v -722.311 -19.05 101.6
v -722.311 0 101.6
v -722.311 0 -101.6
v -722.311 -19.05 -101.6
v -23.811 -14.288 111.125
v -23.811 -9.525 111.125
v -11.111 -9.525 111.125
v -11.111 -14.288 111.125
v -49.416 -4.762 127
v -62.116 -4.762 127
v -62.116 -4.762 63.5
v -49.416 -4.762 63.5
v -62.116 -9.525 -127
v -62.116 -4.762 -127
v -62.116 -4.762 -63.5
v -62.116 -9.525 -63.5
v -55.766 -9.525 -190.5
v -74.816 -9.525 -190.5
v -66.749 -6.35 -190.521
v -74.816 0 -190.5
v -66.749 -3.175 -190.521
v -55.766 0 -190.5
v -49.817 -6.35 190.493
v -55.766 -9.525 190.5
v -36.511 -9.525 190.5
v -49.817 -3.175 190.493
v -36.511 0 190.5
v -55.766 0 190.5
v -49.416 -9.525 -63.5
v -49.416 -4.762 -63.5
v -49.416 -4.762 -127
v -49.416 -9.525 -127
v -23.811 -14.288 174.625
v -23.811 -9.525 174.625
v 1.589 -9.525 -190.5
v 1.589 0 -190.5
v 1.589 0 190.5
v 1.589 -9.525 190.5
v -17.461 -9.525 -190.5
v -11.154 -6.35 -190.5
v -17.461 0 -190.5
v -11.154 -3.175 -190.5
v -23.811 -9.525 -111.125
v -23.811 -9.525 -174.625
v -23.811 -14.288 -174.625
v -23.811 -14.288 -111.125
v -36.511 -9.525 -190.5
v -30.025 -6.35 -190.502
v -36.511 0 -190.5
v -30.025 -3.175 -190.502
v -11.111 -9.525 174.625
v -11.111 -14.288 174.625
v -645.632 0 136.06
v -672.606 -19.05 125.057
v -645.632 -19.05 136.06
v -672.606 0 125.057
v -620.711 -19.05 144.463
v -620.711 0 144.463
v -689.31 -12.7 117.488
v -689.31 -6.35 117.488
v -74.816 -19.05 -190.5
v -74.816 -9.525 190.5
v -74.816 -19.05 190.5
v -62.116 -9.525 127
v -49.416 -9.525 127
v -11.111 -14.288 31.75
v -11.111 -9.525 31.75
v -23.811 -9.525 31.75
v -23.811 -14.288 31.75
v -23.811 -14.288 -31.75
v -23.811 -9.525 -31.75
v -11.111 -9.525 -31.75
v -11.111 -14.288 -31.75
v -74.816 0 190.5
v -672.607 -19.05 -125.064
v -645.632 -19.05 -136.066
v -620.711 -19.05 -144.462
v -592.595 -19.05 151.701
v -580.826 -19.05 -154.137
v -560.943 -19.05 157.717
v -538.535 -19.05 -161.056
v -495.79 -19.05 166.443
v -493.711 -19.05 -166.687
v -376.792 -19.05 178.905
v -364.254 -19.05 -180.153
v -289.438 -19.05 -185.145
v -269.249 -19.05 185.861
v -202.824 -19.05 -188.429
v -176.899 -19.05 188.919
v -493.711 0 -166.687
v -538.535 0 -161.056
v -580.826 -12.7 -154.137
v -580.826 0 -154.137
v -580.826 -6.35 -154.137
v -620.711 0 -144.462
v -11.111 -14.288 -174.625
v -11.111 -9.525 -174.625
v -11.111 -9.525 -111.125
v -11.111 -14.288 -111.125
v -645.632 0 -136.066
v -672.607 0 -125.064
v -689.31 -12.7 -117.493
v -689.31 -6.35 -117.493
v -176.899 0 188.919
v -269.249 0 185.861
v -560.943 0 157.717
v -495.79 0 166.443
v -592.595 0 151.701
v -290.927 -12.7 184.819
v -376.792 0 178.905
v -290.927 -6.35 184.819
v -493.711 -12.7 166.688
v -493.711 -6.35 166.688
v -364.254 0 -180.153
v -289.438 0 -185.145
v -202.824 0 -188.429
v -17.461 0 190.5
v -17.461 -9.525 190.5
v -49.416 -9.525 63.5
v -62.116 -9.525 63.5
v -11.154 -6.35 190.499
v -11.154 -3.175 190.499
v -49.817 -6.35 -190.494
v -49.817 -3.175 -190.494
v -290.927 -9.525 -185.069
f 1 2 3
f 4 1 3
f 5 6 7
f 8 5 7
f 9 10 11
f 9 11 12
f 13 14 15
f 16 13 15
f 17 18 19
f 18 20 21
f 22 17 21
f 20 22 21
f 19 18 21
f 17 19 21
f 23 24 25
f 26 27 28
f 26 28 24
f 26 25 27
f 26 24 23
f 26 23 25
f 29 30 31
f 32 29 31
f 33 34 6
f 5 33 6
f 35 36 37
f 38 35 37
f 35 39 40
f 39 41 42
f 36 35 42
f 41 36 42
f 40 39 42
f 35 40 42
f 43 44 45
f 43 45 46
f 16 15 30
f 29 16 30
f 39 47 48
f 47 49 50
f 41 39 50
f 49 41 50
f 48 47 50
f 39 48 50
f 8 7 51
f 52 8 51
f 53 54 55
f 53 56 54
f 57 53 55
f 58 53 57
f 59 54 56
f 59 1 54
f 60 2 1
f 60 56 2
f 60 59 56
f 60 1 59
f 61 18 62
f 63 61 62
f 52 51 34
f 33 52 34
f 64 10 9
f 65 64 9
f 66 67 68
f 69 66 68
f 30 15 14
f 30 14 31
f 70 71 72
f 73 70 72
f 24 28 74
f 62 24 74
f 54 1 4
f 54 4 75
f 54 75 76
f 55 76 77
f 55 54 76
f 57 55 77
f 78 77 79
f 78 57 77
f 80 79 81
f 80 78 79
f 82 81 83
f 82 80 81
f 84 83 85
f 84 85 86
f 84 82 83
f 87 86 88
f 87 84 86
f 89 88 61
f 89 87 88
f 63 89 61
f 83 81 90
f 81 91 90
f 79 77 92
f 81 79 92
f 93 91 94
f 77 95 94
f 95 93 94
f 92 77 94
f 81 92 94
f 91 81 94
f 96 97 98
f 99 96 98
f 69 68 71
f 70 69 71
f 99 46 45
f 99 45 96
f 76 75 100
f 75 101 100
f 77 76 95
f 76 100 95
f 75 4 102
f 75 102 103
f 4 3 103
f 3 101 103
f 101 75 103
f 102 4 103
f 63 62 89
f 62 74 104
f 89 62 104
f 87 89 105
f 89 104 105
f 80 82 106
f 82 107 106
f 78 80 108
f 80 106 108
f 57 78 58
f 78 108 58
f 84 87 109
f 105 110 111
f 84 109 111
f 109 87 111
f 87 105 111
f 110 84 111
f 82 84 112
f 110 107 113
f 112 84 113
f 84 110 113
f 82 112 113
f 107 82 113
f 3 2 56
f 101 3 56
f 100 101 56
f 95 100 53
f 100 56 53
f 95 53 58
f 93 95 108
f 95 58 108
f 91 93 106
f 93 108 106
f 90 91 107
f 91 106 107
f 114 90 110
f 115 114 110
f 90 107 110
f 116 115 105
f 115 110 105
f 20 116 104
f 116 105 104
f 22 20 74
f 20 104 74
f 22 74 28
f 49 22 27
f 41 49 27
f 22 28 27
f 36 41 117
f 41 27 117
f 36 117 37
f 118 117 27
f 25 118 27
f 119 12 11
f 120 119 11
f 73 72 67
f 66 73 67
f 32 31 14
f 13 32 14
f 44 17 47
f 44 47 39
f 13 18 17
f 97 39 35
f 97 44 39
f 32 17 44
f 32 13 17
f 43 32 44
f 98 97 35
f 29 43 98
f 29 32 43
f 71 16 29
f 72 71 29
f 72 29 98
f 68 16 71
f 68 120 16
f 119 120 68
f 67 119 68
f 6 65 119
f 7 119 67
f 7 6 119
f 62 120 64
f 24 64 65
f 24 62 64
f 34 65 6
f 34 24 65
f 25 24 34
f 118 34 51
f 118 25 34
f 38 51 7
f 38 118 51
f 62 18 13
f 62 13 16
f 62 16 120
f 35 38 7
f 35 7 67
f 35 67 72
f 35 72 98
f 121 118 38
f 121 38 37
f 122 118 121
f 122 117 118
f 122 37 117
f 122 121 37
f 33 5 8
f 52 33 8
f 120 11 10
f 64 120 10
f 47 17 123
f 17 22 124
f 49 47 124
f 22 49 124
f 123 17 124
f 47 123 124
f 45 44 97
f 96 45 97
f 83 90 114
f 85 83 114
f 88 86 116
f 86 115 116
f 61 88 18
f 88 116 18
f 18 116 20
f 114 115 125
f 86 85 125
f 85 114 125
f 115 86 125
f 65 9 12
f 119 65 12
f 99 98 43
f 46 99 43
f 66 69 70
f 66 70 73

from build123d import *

# Parameters (mm, degrees)
F1_DEPTH = 19.05
F2_DEPTH = 9.525
F0_W     = 6.35
F0_H     = 63.5
F3_DEPTH = 4.7625
F0_H_2   = 31.75
F4_DEPTH = 14.2875


with BuildPart() as f1:
    # F0 (on Front) → F1 (new body)
    with BuildSketch(Plane.XZ):
        with BuildLine():
            Line((-722.3111987114, 1.2279e-06), (-620.7111987114, 1.2279e-06))
            Line((-620.7111987114, 1.2279e-06), (-620.7111987114, 144.4625012279))
            add(Edge.make_bspline(
                [(-722.3111987114, 101.6000012279), (-689.4180363188, 117.6879881372), (-656.5248739262, 133.7759750465), (-620.7111987114, 144.4625012279)],
                knots=[0, 0, 0, 0, 0.1537268507, 0.1537268507, 0.1537268507, 0.1537268507], degree=3))
            Line((-722.3111987114, 101.6000012279), (-722.3111987114, 1.2279e-06))
        make_face()
        with BuildLine():
            Line((-620.7111987114, 1.2279e-06), (-493.7111987114, 1.2279e-06))
            Line((-493.7111987114, 1.2279e-06), (-493.7111987114, 166.6875012279))
            add(Edge.make_bspline(
                [(-620.7111987114, 144.4625012279), (-581.9859047534, 156.0178321253), (-539.8459247327, 161.2577335799), (-493.7111987114, 166.6875012279)],
                knots=[0.1537268507, 0.1537268507, 0.1537268507, 0.1537268507, 0.3199515525, 0.3199515525, 0.3199515525, 0.3199515525], degree=3))
            Line((-620.7111987114, 144.4625012279), (-620.7111987114, 1.2279e-06))
        make_face()
        with BuildLine():
            Line((-620.7111987114, -144.4624987721), (-620.7111987114, 1.2279e-06))
            Line((-620.7111987114, 1.2279e-06), (-722.3111987114, 1.2279e-06))
            Line((-722.3111987114, 1.2279e-06), (-722.3111987114, -101.5999987721))
            add(Edge.make_bspline(
                [(-722.3111987114, -101.5999987721), (-689.4182841733, -117.6941564691), (-656.5253696352, -133.7883141661), (-620.7111987114, -144.4624987721)],
                knots=[0, 0, 0, 0, 0.1537255771, 0.1537255771, 0.1537255771, 0.1537255771], degree=3))
        make_face()
        with BuildLine():
            Line((-493.7111987114, -166.6874987721), (-493.7111987114, 1.2279e-06))
            Line((-493.7111987114, 1.2279e-06), (-620.7111987114, 1.2279e-06))
            Line((-620.7111987114, 1.2279e-06), (-620.7111987114, -144.4624987721))
            add(Edge.make_bspline(
                [(-620.7111987114, -144.4624987721), (-581.9853687438, -156.0044847356), (-539.8439833334, -161.2093964589), (-493.7111987114, -166.6874987721)],
                knots=[0.1537255771, 0.1537255771, 0.1537255771, 0.1537255771, 0.3199489018, 0.3199489018, 0.3199489018, 0.3199489018], degree=3))
        make_face()
        with BuildLine():
            Line((-290.9272084468, -185.0685181572), (-290.9272084468, -0.1247681572))
            Line((-290.9272084468, -0.1247681572), (-290.9272084468, 1.2279e-06))
            Line((-290.9272084468, 1.2279e-06), (-493.7111987114, 1.2279e-06))
            Line((-493.7111987114, 1.2279e-06), (-493.7111987114, -166.6874987721))
            add(Edge.make_bspline(
                [(-493.7111987114, -166.6874987721), (-435.736581071, -173.5717761816), (-371.4584655156, -180.8874953545), (-290.9272084468, -185.0685181572)],
                knots=[0.3199489018, 0.3199489018, 0.3199489018, 0.3199489018, 0.5288401224, 0.5288401224, 0.5288401224, 0.5288401224], degree=3))
        make_face()
        with BuildLine():
            Line((-493.7111987114, 1.2279e-06), (-290.9272084468, 1.2279e-06))
            Line((-290.9272084468, 1.2279e-06), (-290.9272084468, 184.8189818428))
            add(Edge.make_bspline(
                [(-493.7111987114, 166.6875012279), (-435.7373269286, 173.5106620133), (-371.4553650094, 180.633639874), (-290.9272084468, 184.8189818428)],
                knots=[0.3199515525, 0.3199515525, 0.3199515525, 0.3199515525, 0.528833026, 0.528833026, 0.528833026, 0.528833026], degree=3))
            Line((-493.7111987114, 166.6875012279), (-493.7111987114, 1.2279e-06))
        make_face()
        with BuildLine():
            Line((-290.9272084468, 184.8189818428), (-290.9272084468, 1.2279e-06))
            Line((-290.9272084468, 1.2279e-06), (-74.8163211554, 1.2279e-06))
            Line((-74.8163211554, 1.2279e-06), (-74.8163211554, 190.5000012279))
            add(Edge.make_bspline(
                [(-290.9272084468, 184.8189818428), (-207.9460116468, 189.1318172586), (-107.7137651743, 190.3253189595), (-74.8163211554, 190.5000012279)],
                knots=[0.528833026, 0.528833026, 0.528833026, 0.528833026, 0.744077425, 0.744077425, 0.744077425, 0.744077425], degree=3))
        make_face()
        with BuildLine():
            Line((-290.9272084468, 1.2279e-06), (-290.9272084468, -0.1247681572))
            Line((-290.9272084468, -0.1247681572), (-290.9272084468, -185.0685181572))
            add(Edge.make_bspline(
                [(-290.9272084468, -185.0685181572), (-207.9486072246, -189.376602204), (-107.7139882364, -190.35656804), (-74.8163211554, -190.4999987721)],
                knots=[0.5288401224, 0.5288401224, 0.5288401224, 0.5288401224, 0.7440795453, 0.7440795453, 0.7440795453, 0.7440795453], degree=3))
            Line((-74.8163211554, -190.4999987721), (-74.8163211554, 1.2279e-06))
            Line((-74.8163211554, 1.2279e-06), (-290.9272084468, 1.2279e-06))
        make_face()
    extrude(amount=F1_DEPTH)

    # F0 (on Front) → F2 (join)
    with BuildSketch(Plane.XZ):
        Polygon((-74.8163211554, 190.5000012279), (-74.8163211554, 1.2279e-06), (-55.7663211554, 1.2279e-06), (-55.7663211554, 63.5000012279), (-62.1163211554, 63.5000012279), (-62.1163211554, 127.0000012279), (-55.7663211554, 127.0000012279), (-55.7663211554, 190.5000012279), align=None)
        with BuildLine():
            Line((-55.7663211554, 1.2279e-06), (-74.8163211554, 1.2279e-06))
            Line((-74.8163211554, 1.2279e-06), (-74.8163211554, -190.4999987721))
            add(Edge.make_bspline(
                [(-74.8163211554, -190.4999987721), (-65.0505687749, -190.5425765334), (-61.2186404836, -190.5114376797), (-55.7663211554, -190.4999987721)],
                knots=[0.7440795453, 0.7440795453, 0.7440795453, 0.7440795453, 0.8079738908, 0.8079738908, 0.8079738908, 0.8079738908], degree=3))
            Line((-55.7663211554, -190.4999987721), (-55.7663211554, -126.9999987721))
            Line((-55.7663211554, -126.9999987721), (-62.1163211554, -126.9999987721))
            Line((-62.1163211554, -126.9999987721), (-62.1163211554, -63.4999987721))
            Line((-62.1163211554, -63.4999987721), (-55.7663211554, -63.4999987721))
            Line((-55.7663211554, -63.4999987721), (-55.7663211554, 1.2279e-06))
        make_face()
        with BuildLine():
            Line((-55.7663211554, 63.5000012279), (-55.7663211554, 1.2279e-06))
            Line((-55.7663211554, 1.2279e-06), (-36.7163211554, 1.2279e-06))
            Line((-36.7163211554, 1.2279e-06), (-36.5111987114, 1.2279e-06))
            Line((-36.5111987114, 1.2279e-06), (-36.5111987114, 190.5000012279))
            add(Edge.make_bspline(
                [(-55.7663211554, 190.5000012279), (-50.284669262, 190.4859953489), (-43.1652773507, 190.4962397359), (-36.5111987114, 190.5000012279)],
                knots=[0.8079722998, 0.8079722998, 0.8079722998, 0.8079722998, 0.8722102503, 0.8722102503, 0.8722102503, 0.8722102503], degree=3))
            Line((-55.7663211554, 190.5000012279), (-55.7663211554, 127.0000012279))
            Line((-55.7663211554, 127.0000012279), (-49.4163211554, 127.0000012279))
            Line((-49.4163211554, 127.0000012279), (-49.4163211554, 63.5000012279))
            Line((-49.4163211554, 63.5000012279), (-55.7663211554, 63.5000012279))
        make_face()
        with BuildLine():
            Line((-36.7163211554, 1.2279e-06), (-55.7663211554, 1.2279e-06))
            Line((-55.7663211554, 1.2279e-06), (-55.7663211554, -63.4999987721))
            Line((-55.7663211554, -63.4999987721), (-49.4163211554, -63.4999987721))
            Line((-49.4163211554, -63.4999987721), (-49.4163211554, -126.9999987721))
            Line((-49.4163211554, -126.9999987721), (-55.7663211554, -126.9999987721))
            Line((-55.7663211554, -126.9999987721), (-55.7663211554, -190.4999987721))
            add(Edge.make_bspline(
                [(-55.7663211554, -190.4999987721), (-50.2847262742, -190.4884984448), (-43.1652926622, -190.4969101842), (-36.5111987114, -190.4999987721)],
                knots=[0.8079738908, 0.8079738908, 0.8079738908, 0.8079738908, 0.872211309, 0.872211309, 0.872211309, 0.872211309], degree=3))
            Line((-36.5111987114, -190.4999987721), (-36.5111987114, 1.2279e-06))
            Line((-36.5111987114, 1.2279e-06), (-36.7163211554, 1.2279e-06))
        make_face()
        with BuildLine():
            Line((-36.5111987114, 1.2279e-06), (-36.5111987114, -190.4999987721))
            add(Edge.make_bspline(
                [(-36.5111987114, -190.4999987721), (-29.8926422792, -190.5030708649), (-23.7344683022, -190.5008765129), (-17.4611987114, -190.4999987721)],
                knots=[0.872211309, 0.872211309, 0.872211309, 0.872211309, 0.9361056545, 0.9361056545, 0.9361056545, 0.9361056545], degree=3))
            Line((-17.4611987114, -190.4999987721), (-17.4611987114, -174.6249987721))
            Line((-17.4611987114, -174.6249987721), (-23.8111987114, -174.6249987721))
            Line((-23.8111987114, -174.6249987721), (-23.8111987114, -111.1249987721))
            Line((-23.8111987114, -111.1249987721), (-17.4611987114, -111.1249987721))
            Line((-17.4611987114, -111.1249987721), (-17.4611987114, -95.2499987721))
            Line((-17.4611987114, -95.2499987721), (-17.4611987114, -31.7499987721))
            Line((-17.4611987114, -31.7499987721), (-23.8111987114, -31.7499987721))
            Line((-23.8111987114, -31.7499987721), (-23.8111987114, 1.2279e-06))
            Line((-23.8111987114, 1.2279e-06), (-36.5111987114, 1.2279e-06))
        make_face()
        Polygon((-17.4611987114, 190.5000012279), (-36.5111987114, 190.5000012279), (-36.5111987114, 1.2279e-06), (-23.8111987114, 1.2279e-06), (-23.8111987114, 31.7500012279), (-17.4611987114, 31.7500012279), (-17.4611987114, 95.2500012279), (-17.4611987114, 111.1250012279), (-23.8111987114, 111.1250012279), (-23.8111987114, 174.6250012279), (-17.4611987114, 174.6250012279), align=None)
        with BuildLine():
            Line((-17.4611987114, -174.6249987721), (-17.4611987114, -190.4999987721))
            add(Edge.make_bspline(
                [(-17.4611987114, -190.4999987721), (-11.1879291206, -190.4991210314), (-4.799563916, -190.4995599018), (1.5888012886, -190.4999987721)],
                knots=[0.9361056545, 0.9361056545, 0.9361056545, 0.9361056545, 1, 1, 1, 1], degree=3))
            Line((1.5888012886, -190.4999987721), (1.5888012886, 1.2279e-06))
            Line((1.5888012886, 1.2279e-06), (-11.1111987114, 1.2279e-06))
            Line((-11.1111987114, 1.2279e-06), (-11.1111987114, -31.7499987721))
            Line((-11.1111987114, -31.7499987721), (-17.4611987114, -31.7499987721))
            Line((-17.4611987114, -31.7499987721), (-17.4611987114, -95.2499987721))
            Line((-17.4611987114, -95.2499987721), (-17.4611987114, -111.1249987721))
            Line((-17.4611987114, -111.1249987721), (-11.1111987114, -111.1249987721))
            Line((-11.1111987114, -111.1249987721), (-11.1111987114, -174.6249987721))
            Line((-11.1111987114, -174.6249987721), (-17.4611987114, -174.6249987721))
        make_face()
        with BuildLine():
            add(Edge.make_bspline(
                [(-17.4611987114, 190.5000012279), (-11.1879247692, 190.4989322556), (-4.7995617403, 190.4994667417), (1.5888012886, 190.5000012279)],
                knots=[0.9361051251, 0.9361051251, 0.9361051251, 0.9361051251, 1, 1, 1, 1], degree=3))
            Line((-17.4611987114, 190.5000012279), (-17.4611987114, 174.6250012279))
            Line((-17.4611987114, 174.6250012279), (-11.1111987114, 174.6250012279))
            Line((-11.1111987114, 174.6250012279), (-11.1111987114, 111.1250012279))
            Line((-11.1111987114, 111.1250012279), (-17.4611987114, 111.1250012279))
            Line((-17.4611987114, 111.1250012279), (-17.4611987114, 95.2500012279))
            Line((-17.4611987114, 95.2500012279), (-17.4611987114, 31.7500012279))
            Line((-17.4611987114, 31.7500012279), (-11.1111987114, 31.7500012279))
            Line((-11.1111987114, 31.7500012279), (-11.1111987114, 1.2279e-06))
            Line((-11.1111987114, 1.2279e-06), (1.5888012886, 1.2279e-06))
            Line((1.5888012886, 1.2279e-06), (1.5888012886, 190.5000012279))
        make_face()
        Polygon((-11.1111987114, 174.6250012279), (-17.4611987114, 174.6250012279), (-17.4611987114, 142.8750012279), (-17.4611987114, 111.1250012279), (-11.1111987114, 111.1250012279), align=None)
        Polygon((-17.4611987114, 142.8750012279), (-17.4611987114, 174.6250012279), (-23.8111987114, 174.6250012279), (-23.8111987114, 111.1250012279), (-17.4611987114, 111.1250012279), align=None)
    extrude(amount=F2_DEPTH)

    # F0 (on Front) → F3 (join)
    with BuildSketch(Plane.XZ):
        with Locations((-58.9413211554, -95.2499987721)):
            Rectangle(F0_W, F0_H)
        with Locations((-52.5913211554, -95.2499987721)):
            Rectangle(F0_W, F0_H)
        Polygon((-74.8163211554, 190.5000012279), (-74.8163211554, 1.2279e-06), (-55.7663211554, 1.2279e-06), (-55.7663211554, 63.5000012279), (-62.1163211554, 63.5000012279), (-62.1163211554, 127.0000012279), (-55.7663211554, 127.0000012279), (-55.7663211554, 190.5000012279), align=None)
        Polygon((-62.1163211554, 63.5000012279), (-55.7663211554, 63.5000012279), (-55.7663211554, 95.2500012279), (-55.7663211554, 127.0000012279), (-62.1163211554, 127.0000012279), align=None)
        with BuildLine():
            Line((-55.7663211554, 63.5000012279), (-55.7663211554, 1.2279e-06))
            Line((-55.7663211554, 1.2279e-06), (-36.7163211554, 1.2279e-06))
            Line((-36.7163211554, 1.2279e-06), (-36.5111987114, 1.2279e-06))
            Line((-36.5111987114, 1.2279e-06), (-36.5111987114, 190.5000012279))
            add(Edge.make_bspline(
                [(-55.7663211554, 190.5000012279), (-50.284669262, 190.4859953489), (-43.1652773507, 190.4962397359), (-36.5111987114, 190.5000012279)],
                knots=[0.8079722998, 0.8079722998, 0.8079722998, 0.8079722998, 0.8722102503, 0.8722102503, 0.8722102503, 0.8722102503], degree=3))
            Line((-55.7663211554, 190.5000012279), (-55.7663211554, 127.0000012279))
            Line((-55.7663211554, 127.0000012279), (-49.4163211554, 127.0000012279))
            Line((-49.4163211554, 127.0000012279), (-49.4163211554, 63.5000012279))
            Line((-49.4163211554, 63.5000012279), (-55.7663211554, 63.5000012279))
        make_face()
        Polygon((-55.7663211554, 95.2500012279), (-55.7663211554, 63.5000012279), (-49.4163211554, 63.5000012279), (-49.4163211554, 127.0000012279), (-55.7663211554, 127.0000012279), align=None)
    extrude(amount=F3_DEPTH)

    # F0 (on Front) → F4 (join)
    with BuildSketch(Plane.XZ):
        with Locations((-20.6361987114, 15.8750012279)):
            Rectangle(F0_W, F0_H_2)
        with Locations((-20.6361987114, -15.8749987721)):
            Rectangle(F0_W, F0_H_2)
        with Locations((-20.6361987114, -142.8749987721)):
            Rectangle(F0_W, F0_H)
        with Locations((-14.2861987114, -142.8749987721)):
            Rectangle(F0_W, F0_H)
        Polygon((-11.1111987114, 174.6250012279), (-17.4611987114, 174.6250012279), (-17.4611987114, 142.8750012279), (-17.4611987114, 111.1250012279), (-11.1111987114, 111.1250012279), align=None)
        Polygon((-17.4611987114, 142.8750012279), (-17.4611987114, 174.6250012279), (-23.8111987114, 174.6250012279), (-23.8111987114, 111.1250012279), (-17.4611987114, 111.1250012279), align=None)
        with Locations((-14.2861987114, 15.8750012279)):
            Rectangle(F0_W, F0_H_2)
        with Locations((-14.2861987114, -15.8749987721)):
            Rectangle(F0_W, F0_H_2)
    extrude(amount=F4_DEPTH)


solid = f1.part
